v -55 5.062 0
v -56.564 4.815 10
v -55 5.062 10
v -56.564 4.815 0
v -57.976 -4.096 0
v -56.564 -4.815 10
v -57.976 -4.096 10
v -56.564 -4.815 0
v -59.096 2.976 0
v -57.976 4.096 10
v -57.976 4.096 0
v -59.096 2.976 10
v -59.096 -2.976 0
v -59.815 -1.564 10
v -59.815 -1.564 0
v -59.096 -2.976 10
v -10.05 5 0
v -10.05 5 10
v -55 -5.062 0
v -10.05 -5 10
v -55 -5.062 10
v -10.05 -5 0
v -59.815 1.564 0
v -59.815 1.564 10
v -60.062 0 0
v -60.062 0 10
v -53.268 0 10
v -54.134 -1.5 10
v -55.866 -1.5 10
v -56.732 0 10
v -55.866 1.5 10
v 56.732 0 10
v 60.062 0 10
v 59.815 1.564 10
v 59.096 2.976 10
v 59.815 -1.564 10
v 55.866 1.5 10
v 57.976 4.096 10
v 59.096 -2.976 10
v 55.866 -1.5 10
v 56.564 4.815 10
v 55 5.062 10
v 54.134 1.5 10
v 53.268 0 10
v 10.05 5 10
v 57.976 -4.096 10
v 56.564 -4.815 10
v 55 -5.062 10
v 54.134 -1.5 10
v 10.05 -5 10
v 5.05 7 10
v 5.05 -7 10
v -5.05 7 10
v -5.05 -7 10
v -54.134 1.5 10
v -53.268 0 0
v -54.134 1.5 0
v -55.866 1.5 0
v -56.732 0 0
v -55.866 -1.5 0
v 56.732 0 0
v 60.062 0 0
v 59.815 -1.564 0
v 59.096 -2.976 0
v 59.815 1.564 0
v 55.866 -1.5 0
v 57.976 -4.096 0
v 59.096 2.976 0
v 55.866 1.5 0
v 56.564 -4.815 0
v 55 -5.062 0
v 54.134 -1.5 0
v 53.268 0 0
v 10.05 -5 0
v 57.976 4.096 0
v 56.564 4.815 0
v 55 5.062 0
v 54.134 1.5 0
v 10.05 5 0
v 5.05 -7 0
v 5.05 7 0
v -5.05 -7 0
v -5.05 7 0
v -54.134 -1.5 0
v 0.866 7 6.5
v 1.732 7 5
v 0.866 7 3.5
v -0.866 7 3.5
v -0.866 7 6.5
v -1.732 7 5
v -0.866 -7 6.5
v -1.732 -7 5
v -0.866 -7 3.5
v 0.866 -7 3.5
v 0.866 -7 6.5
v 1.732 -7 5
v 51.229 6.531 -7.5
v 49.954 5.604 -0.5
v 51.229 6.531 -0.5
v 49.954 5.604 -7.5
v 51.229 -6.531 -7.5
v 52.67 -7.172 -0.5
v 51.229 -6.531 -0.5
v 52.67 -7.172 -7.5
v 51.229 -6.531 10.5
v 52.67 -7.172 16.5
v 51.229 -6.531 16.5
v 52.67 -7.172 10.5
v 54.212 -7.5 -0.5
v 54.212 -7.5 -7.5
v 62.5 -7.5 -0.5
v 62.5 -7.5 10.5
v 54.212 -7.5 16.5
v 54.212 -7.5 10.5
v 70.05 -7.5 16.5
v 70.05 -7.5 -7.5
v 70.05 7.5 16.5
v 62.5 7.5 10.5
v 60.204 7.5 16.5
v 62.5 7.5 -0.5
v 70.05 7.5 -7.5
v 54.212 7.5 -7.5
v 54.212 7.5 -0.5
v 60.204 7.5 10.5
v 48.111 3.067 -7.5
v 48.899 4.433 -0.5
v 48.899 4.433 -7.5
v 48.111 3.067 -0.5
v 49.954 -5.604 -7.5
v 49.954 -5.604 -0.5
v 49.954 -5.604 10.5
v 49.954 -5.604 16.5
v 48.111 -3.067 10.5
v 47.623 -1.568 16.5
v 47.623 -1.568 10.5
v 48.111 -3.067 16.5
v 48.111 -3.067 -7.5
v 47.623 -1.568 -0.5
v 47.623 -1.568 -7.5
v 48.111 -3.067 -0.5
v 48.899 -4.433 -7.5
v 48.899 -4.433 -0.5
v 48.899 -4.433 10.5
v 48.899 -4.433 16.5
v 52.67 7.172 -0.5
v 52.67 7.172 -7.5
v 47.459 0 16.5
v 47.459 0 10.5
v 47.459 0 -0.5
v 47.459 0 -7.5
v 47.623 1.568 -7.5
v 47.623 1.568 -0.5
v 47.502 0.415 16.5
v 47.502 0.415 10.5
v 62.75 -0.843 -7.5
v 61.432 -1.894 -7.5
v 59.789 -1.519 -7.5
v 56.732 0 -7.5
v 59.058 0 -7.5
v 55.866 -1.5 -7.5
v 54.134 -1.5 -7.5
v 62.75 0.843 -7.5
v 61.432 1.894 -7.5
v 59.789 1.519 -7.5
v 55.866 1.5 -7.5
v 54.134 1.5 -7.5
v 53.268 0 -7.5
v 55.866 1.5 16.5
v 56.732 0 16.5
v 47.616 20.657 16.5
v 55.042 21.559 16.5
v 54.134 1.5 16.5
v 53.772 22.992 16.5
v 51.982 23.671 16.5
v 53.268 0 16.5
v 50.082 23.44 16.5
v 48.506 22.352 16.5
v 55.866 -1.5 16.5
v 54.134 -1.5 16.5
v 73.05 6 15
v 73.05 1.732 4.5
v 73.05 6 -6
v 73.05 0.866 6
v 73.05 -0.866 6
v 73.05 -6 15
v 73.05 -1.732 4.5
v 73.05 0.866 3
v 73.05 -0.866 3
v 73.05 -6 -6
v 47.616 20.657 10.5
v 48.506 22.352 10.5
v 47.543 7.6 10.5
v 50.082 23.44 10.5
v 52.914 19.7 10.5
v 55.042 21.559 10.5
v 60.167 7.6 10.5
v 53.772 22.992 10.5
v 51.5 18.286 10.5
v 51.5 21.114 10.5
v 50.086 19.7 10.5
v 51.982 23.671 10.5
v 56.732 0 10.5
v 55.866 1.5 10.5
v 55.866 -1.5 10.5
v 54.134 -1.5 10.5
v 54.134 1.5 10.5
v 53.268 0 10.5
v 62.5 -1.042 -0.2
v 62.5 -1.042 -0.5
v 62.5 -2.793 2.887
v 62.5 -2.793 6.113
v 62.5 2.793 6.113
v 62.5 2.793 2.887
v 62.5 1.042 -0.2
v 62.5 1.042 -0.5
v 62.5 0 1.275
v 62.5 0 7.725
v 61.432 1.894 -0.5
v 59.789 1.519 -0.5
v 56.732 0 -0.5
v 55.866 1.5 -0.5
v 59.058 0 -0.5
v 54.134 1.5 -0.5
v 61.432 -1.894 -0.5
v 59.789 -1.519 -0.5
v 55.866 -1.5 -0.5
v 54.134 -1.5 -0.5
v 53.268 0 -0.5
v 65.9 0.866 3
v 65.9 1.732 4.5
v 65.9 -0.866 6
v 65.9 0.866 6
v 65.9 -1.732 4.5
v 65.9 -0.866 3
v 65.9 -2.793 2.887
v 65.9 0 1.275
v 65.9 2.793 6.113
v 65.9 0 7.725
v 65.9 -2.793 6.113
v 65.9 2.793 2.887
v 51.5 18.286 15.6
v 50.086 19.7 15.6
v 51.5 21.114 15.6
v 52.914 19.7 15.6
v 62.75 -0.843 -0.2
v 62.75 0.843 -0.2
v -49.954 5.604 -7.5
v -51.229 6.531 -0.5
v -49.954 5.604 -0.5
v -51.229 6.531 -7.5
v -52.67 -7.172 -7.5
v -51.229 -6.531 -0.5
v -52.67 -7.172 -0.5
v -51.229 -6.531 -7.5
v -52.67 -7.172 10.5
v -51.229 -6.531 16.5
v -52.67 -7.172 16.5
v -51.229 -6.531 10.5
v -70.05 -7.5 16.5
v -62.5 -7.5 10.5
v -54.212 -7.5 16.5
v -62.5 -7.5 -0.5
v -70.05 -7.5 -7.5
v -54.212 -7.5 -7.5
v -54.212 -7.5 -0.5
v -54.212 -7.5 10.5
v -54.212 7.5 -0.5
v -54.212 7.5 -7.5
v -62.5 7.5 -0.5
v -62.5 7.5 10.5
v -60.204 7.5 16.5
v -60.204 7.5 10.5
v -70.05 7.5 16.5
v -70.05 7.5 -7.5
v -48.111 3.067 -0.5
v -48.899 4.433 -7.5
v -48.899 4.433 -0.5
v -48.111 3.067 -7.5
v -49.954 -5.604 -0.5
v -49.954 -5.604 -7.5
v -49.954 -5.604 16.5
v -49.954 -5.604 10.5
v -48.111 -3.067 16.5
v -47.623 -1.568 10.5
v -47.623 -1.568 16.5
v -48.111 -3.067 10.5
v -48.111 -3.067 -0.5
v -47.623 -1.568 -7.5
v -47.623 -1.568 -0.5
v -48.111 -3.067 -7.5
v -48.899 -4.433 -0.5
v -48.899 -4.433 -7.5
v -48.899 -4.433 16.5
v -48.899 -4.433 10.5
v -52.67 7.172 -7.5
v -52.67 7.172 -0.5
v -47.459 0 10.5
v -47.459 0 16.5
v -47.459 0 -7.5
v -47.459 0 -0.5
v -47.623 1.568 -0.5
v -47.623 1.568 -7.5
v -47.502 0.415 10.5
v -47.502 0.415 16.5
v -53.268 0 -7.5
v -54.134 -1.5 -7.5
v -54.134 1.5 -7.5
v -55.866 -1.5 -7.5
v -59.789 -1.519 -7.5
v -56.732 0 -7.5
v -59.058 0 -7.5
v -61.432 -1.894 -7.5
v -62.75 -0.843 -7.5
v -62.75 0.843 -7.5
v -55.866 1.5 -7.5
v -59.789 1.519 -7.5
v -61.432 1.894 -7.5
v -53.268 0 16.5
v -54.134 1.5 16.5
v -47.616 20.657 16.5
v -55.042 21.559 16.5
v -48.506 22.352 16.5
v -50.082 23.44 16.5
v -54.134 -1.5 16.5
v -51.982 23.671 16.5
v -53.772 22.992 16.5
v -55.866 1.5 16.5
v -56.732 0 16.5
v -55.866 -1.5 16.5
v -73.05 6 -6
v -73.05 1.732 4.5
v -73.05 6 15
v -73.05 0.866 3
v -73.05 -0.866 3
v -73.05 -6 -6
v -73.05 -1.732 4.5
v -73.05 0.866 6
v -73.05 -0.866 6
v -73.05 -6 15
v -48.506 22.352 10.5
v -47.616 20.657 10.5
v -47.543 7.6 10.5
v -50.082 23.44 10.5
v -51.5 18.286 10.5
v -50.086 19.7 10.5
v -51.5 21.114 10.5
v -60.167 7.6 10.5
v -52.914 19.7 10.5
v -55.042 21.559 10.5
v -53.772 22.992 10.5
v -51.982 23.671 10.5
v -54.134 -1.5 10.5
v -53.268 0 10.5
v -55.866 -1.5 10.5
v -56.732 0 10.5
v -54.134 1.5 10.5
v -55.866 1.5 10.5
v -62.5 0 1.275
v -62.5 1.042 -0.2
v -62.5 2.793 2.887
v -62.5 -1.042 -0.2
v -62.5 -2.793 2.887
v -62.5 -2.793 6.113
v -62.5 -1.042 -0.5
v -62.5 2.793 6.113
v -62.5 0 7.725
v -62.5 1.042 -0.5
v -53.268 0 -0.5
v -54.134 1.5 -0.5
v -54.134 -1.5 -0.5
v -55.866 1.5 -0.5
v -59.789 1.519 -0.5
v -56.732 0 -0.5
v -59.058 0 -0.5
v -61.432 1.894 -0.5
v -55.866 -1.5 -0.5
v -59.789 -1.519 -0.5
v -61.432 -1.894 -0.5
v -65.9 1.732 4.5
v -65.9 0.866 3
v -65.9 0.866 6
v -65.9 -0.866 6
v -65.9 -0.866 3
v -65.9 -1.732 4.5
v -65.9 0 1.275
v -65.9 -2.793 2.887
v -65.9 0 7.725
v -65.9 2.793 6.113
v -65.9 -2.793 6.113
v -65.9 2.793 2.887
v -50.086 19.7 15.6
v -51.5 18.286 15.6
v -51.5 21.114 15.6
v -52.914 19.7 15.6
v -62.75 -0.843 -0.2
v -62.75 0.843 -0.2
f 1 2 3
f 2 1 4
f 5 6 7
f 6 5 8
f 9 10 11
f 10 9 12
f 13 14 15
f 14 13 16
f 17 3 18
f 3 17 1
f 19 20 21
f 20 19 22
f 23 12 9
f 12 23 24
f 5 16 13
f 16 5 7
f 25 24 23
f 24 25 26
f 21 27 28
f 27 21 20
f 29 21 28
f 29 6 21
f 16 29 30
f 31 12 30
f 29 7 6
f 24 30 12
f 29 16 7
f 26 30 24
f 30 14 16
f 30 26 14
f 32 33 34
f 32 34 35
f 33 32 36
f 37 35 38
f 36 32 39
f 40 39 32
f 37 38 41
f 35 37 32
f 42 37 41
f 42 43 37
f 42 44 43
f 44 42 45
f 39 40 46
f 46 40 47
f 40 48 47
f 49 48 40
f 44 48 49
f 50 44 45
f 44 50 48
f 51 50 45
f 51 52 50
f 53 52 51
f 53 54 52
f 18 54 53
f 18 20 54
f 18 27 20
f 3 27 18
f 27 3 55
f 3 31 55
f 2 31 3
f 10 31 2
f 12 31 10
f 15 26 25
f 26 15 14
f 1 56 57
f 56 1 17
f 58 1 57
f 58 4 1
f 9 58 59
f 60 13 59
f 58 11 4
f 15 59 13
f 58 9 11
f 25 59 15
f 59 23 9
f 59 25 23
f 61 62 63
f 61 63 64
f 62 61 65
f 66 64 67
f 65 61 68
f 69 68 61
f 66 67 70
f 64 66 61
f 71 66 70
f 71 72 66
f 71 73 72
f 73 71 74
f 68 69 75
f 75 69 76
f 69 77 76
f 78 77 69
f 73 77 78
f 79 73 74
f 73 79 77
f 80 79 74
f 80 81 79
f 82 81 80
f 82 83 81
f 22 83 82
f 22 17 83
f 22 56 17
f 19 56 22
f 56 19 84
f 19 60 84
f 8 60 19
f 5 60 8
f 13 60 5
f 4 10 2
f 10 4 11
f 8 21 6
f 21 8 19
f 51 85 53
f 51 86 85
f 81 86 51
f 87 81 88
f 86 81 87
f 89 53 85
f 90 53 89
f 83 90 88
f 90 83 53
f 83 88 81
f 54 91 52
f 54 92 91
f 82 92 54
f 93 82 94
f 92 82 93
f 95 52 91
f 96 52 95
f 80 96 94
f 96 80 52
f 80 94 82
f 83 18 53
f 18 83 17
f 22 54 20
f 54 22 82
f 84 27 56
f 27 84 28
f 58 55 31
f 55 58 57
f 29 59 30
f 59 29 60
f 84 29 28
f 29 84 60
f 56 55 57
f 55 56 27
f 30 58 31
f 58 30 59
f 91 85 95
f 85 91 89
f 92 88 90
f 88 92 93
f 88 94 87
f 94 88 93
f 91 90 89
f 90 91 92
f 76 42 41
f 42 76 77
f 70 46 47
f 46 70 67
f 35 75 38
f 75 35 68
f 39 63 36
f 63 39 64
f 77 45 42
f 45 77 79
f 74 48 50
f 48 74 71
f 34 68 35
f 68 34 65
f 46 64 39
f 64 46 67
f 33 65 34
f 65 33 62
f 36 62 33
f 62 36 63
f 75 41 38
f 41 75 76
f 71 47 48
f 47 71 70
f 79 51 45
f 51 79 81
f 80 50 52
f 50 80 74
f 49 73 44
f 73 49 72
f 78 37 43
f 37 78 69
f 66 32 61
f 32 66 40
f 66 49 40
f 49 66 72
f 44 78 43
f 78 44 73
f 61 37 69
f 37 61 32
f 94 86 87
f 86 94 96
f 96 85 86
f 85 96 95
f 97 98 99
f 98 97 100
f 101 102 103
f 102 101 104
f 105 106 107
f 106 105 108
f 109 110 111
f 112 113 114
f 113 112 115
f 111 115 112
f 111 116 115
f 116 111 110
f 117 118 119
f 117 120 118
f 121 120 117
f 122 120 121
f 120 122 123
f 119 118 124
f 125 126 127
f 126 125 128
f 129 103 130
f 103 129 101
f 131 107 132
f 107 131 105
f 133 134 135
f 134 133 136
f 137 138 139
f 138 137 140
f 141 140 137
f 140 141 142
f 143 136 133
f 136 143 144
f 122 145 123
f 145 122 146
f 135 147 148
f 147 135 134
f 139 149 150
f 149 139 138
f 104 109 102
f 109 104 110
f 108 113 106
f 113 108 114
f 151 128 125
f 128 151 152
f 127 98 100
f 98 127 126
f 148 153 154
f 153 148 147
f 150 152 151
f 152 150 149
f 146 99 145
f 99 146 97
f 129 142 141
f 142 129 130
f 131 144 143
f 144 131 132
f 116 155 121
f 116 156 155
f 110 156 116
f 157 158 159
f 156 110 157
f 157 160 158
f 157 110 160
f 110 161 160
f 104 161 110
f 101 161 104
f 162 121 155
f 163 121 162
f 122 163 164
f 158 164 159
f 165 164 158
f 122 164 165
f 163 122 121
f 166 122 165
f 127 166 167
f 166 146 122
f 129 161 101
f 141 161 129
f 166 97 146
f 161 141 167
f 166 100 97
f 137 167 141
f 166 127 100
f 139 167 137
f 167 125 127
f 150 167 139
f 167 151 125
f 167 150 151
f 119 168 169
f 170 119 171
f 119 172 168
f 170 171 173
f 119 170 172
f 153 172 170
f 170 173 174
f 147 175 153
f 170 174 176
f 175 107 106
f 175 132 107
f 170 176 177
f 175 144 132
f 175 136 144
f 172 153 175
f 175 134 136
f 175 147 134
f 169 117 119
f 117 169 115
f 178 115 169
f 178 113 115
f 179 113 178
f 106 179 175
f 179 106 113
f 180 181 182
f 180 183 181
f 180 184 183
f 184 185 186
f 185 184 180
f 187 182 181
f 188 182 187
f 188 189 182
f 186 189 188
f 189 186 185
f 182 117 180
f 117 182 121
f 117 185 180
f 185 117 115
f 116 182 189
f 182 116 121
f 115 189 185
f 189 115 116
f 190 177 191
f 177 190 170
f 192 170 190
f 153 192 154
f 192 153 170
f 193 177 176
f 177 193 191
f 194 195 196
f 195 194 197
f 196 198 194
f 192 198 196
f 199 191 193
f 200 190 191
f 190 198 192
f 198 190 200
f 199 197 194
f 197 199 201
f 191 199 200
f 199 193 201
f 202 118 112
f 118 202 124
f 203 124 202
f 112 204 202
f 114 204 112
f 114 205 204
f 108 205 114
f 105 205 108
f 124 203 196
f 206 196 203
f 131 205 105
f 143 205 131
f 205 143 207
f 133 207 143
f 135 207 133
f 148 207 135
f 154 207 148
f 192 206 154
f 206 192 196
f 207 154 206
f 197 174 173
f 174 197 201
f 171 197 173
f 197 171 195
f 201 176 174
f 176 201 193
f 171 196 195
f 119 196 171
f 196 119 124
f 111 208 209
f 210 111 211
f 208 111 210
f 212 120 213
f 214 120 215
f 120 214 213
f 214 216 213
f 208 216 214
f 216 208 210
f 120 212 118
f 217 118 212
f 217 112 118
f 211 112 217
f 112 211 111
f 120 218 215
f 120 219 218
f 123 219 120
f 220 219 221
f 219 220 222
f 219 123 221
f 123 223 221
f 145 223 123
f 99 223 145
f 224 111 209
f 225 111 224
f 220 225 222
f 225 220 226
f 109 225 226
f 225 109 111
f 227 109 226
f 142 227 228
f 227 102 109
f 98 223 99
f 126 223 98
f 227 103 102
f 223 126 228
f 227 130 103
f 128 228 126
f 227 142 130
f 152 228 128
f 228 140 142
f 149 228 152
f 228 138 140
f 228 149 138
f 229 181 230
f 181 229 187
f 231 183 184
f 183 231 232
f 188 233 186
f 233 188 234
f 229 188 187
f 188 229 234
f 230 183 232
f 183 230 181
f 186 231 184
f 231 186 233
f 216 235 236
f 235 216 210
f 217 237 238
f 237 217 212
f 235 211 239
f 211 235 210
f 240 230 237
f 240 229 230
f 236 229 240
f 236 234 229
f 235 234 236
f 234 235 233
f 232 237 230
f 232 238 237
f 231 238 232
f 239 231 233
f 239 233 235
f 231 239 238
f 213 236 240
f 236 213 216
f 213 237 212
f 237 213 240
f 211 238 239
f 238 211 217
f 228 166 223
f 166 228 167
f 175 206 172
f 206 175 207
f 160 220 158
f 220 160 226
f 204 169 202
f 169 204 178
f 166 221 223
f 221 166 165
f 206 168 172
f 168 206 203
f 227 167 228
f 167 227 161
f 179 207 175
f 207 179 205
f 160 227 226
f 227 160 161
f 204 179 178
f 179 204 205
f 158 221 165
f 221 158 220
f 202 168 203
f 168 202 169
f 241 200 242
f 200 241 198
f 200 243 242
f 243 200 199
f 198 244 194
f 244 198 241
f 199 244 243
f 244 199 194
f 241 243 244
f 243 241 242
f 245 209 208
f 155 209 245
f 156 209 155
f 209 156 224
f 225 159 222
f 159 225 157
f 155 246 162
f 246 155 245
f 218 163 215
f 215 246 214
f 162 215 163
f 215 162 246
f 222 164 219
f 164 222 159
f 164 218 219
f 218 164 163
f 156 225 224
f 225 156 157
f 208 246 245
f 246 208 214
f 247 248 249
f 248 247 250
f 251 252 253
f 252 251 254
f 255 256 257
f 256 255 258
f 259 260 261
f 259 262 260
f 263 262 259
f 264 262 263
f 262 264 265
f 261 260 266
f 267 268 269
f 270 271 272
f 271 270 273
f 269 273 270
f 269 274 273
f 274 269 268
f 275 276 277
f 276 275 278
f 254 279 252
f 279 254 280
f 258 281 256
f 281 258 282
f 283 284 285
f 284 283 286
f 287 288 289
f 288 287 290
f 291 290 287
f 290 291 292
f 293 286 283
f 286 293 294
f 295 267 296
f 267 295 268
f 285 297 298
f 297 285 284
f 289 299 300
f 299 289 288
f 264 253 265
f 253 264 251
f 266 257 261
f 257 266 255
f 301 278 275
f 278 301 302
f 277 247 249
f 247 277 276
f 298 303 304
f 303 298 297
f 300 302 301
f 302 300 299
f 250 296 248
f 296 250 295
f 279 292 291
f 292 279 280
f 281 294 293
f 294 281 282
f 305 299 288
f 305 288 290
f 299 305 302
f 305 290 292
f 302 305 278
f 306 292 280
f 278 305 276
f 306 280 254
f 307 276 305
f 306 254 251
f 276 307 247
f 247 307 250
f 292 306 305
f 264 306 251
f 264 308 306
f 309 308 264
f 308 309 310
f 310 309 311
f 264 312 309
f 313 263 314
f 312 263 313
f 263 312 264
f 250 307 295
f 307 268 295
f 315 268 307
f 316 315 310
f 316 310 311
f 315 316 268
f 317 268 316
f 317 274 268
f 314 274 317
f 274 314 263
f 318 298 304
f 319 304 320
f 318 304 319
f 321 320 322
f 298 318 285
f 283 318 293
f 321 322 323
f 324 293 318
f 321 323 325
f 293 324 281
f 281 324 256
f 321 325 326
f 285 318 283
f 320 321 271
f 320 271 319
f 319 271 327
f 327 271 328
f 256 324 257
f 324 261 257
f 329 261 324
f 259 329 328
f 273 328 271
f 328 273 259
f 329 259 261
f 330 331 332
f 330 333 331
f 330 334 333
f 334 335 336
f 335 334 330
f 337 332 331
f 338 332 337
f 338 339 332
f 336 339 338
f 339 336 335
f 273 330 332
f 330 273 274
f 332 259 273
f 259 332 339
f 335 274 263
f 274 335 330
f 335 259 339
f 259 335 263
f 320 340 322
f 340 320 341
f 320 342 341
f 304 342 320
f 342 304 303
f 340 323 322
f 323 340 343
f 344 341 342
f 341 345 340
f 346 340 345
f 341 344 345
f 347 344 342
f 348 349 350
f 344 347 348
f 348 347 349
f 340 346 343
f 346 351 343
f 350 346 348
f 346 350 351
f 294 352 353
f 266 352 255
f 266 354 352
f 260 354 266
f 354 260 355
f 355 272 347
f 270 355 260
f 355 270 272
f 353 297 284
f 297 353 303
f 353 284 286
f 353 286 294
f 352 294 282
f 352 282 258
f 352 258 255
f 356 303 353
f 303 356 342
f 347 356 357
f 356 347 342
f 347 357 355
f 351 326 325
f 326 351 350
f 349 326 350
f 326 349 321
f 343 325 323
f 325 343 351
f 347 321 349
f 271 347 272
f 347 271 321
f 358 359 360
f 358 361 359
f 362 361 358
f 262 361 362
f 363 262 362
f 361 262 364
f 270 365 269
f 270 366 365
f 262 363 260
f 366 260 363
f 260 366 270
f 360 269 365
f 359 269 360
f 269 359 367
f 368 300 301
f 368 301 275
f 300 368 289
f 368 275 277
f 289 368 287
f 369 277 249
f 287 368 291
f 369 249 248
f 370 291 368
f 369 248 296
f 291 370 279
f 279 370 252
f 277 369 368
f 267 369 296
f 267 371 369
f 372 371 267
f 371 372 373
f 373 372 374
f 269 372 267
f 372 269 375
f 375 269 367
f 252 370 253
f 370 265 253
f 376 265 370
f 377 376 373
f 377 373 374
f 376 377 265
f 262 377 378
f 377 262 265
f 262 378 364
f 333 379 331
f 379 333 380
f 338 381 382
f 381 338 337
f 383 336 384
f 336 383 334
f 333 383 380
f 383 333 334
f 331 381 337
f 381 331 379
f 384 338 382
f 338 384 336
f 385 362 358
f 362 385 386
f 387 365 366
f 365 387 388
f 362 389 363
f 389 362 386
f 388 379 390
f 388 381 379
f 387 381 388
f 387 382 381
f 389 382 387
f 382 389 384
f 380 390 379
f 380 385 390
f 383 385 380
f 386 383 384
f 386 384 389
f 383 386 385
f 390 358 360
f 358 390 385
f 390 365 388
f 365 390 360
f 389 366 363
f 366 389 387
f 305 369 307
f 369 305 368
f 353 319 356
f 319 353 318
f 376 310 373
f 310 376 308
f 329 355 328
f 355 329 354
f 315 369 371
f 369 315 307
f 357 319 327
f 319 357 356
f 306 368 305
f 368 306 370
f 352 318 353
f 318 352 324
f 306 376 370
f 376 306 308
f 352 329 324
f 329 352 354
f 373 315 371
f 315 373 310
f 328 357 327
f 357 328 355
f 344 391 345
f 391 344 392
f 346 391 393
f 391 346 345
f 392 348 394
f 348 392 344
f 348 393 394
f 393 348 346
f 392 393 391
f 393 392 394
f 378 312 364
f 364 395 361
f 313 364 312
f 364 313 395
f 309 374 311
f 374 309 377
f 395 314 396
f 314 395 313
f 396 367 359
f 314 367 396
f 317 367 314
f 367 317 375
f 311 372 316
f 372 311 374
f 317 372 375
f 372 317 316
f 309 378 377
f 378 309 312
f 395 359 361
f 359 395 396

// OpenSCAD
/*-----------------------------------------------------------------------------------

 Front axle for model Unimog M 1:16 (Bruder Toys chassis)
  
 (c) 2013 by Stemer114 (stemer114@gmail.com)
 License: licensed under the 
          Creative Commons - Attribution - Share Alike license. 
          http://creativecommons.org/licenses/by-sa/3.0/

 Credits: polyholes by nophead from MCAD library
          https://github.com/SolidCode/MCAD

-----------------------------------------------------------------------------------
*/

//-----------------------------------------------------------------------------------
//libraries
//-----------------------------------------------------------------------------------
use <MCAD/polyholes.scad>
//test_polyhole();


//-----------------------------------------------------------------------------------
//display settings
//-----------------------------------------------------------------------------------


//-----------------------------------------------------------------------------------
// View settings
// (when exporting single stls for printing, enable these one by one)
//-----------------------------------------------------------------------------------
show_AxleBody       = true;
show_AxleArmRight   = true;
show_AxleArmLeft    = true;
show_ServoConnector = false;
//explosion view
ex = 0;  // 0 - disabled, 1 - enabled

//-----------------------------------------------------------------------------------
// printer/printing settings
// (some dimensions are tuned to printer settings)
//
// the axle arms need to be printed upside down!
//-----------------------------------------------------------------------------------
layer_h = 0.3;  //layer height when printing
nozzle_d = 0.4; //nozzle size (adjust for your printer)

//-----------------------------------------------------------------------------------
// support settings
// (for the axle arms, you can enable creating support walls for printing
// the slicer might be able to create supports automtically
// but I prefer to create them manually just the way I need them
// when creating supports, enable explosion view (see above)
// else the model might look weird
//-----------------------------------------------------------------------------------
create_Support = false;
support_d = nozzle_d*3;  //support wall thickness (multiple of nozzle size)
support_color = "green"; //support color and alpha settings
support_alpha = 0.4;     //adjust these for better viewing in F5 mode

//-----------------------------------------------------------------------------------
//global configuration settings
//-----------------------------------------------------------------------------------
de = 0.1; //epsilon param, so differences are scaled and do not become manifold
fn_hole = 12;  //fn setting for round holes/bores (polyhole)


//-----------------------------------------------------------------------------------
//parameter settings (object dimensions)
//-----------------------------------------------------------------------------------

//P1xx - axle body
P100 = 10;  //height
P101 = 110;  //length
P102 = 10;  //thickness
P110 = 14;  //center support thickness
P111 = 20;  //center support width
P112 = 10;  //center support outer width
P120 = 3;   //diameter Achsschenkelbohrung
P121 = 3;   //diameter central support bore

//P2xx axle arm 
P200exRight = [15, 0, 0];    //explosion view offset vector (right arm)
P200exLeft  = [-15, 0, 0];   //explosion view offset vector (left arm)
P201 = P100+1;  //clearance height
P202 = 7;     //thickness bottom
P203 = 6;     //thickness top
P205 = 15;      //arm width
P206 = 18;      //arm length towards wheel
P207 = 15;      //inner clearance
P2081 = 3;      //offset endcap (x)
P2082 = 3;      //offset endcap (z)
P2083 = 3;      //offset endcap (y)
P210 = 3;       //diameter wheel axle bore
P220 = 3;       //diameter axle connect bore
//steering arm
P230 = 19.7;    //steering arm y offset
P231 = 3.5;     //steering arm x offset
P232 = 8;       //steering arm end width
P233 = P205;    //steering arm width at axle arm
P235 = 2;       //dia for connecting tie rod
P236 = P220;    //dia for axle arm connect
//alignment cutout for servo connector beam
//(on both sides, so one is free where to put the servo connector beam)
P240 = 6;       //offset from axle connector
P241 = 3.5;       //diameter (polyhole)
P242 = P202+layer_h;       //depth

//P3xx - Servo connector arm (below)
P300ex = [15, 0, -9];    //explosion view offset vector
P300 = P101/2;  //length
P301 = P240;    //offset to alignemnt bolt
P302 = P206-P2081;    //length outside part
P305 = P205;    //width outside part
P306 = 6;       //thickness
P307 = 3;       //connecting beam width
P310 = 8;       //servo connector diameter
P320 = 2;       //dia for ball head mounting
P321 = P220;    //dia for axle mounting
P322 = P241-0.2;    //dia for alignment bolt

//-----------------------------------------------------------------------------------
// nut trap config
// screw/nut dimensions for use (plus clearance for fitting purpose)
//-----------------------------------------------------------------------------------
nut_trap_wrenchsize = 5.5; //for M3 nut
nut_trap_depth = 3.5;      //nyloc


//-----------------------------------------------------------------------------------
// main rendering
//-----------------------------------------------------------------------------------

//for debugging, show transparent cube at origin
//if (show_debugging_cube)
//	%cube(10);

AxleAssembly();



//-----------------------------------------------------------------------------------
// modules
//-----------------------------------------------------------------------------------

// render the complete assembly, depending what components are enabled
module AxleAssembly()
{
    union()
    {
        if (show_AxleBody) {
            translate([0, 0, 0])
                AxleBody();
        }
        if (show_AxleArmRight) {
            translate(P200exRight*ex)
            translate([P101/2, 0, -P202 - (P201-P100)/2])
                AxleArmRight();
        }
        if (show_AxleArmLeft) {
            translate(P200exLeft*ex)
            translate([-P101/2, 0, -P202 - (P201-P100)/2])
                AxleArmLeft();
        }
        if (show_ServoConnector) {
            translate(P300ex*ex)
            translate([0, 0, P100/2-P201/2-P202-P306])
            ServoConnector();
        }
 

    }  //end union

}  //end module


module AxleBody()
{
    //left arm
    AxleBodyArm();
    //right arm
    mirror([1, 0, 0]) AxleBodyArm();
}

//arm is oriented towards left
module AxleBodyArm()
{
    difference()
    {
        union()
        {
            //outer part
            hull() {
                translate([-P101/2, 0, 0])
                    //cylinder(h=P100, r=P102/2);
                    polyhole(P100, P102);
                translate([-P111/2, 0, P100/2])
                    cube([de, P102, P100], center=true);
             }
            
            //intermediate part
            hull() {
                translate([-P111/2, 0, P100/2])
                    cube([de, P102, P100], center=true);
                translate([-P112/2, 0, P100/2])
                    cube([de, P110, P100], center=true);
             }

            //center part
            hull() {
                translate([-P112/2, 0, P100/2])
                    cube([de, P110, P100], center=true);
                translate([0, 0, P100/2])
                    cube([de, P110, P100], center=true);
              }
        }

        union()
        {
            //outer bore for Achsschenkel
            translate([-P101/2, 0, -de])
                polyhole(P100+2*de, P120);

            //bore for central support
            translate([0, P110/2+de, P100/2])
                rotate([90, 0, 0])
                polyhole(P110+2*de, P121);

        }
    }
}

module AxleArmRight()
{
    AxleArm();
}

module AxleArmLeft()
{
    mirror([1, 0, 0]) 
    {
        AxleArm();
    }
}
 
 

//Achsschenkel rechts, nur mit Lenkhebel
module AxleArm()
{
    difference()
    {
        union()
        {
            //axle inner part with connector to axle body
            hull() {
                translate([0, 0, 0])
                    //cylinder(h=P201+P202+P203, r=P205/2);
                    polyhole(P201+P202+P203, P205);
                translate([P206-P2081, 0, (P201+P202+P203)/2])
                    cube([de, P205, P201+P202+P203], center=true);
            }
            //outer part with chamfers and bore for wheel axle
            hull() {
                translate([P206-P2081, 0, (P201+P202+P203)/2])
                    cube([de, P205, P201+P202+P203], center=true);
                translate([P206, 0, (P201+P202+P203)/2])
                    cube([de, P205-P2083, P201+P202+P203-P2082], center=true);
            }

            //steering arm
            hull() {
                //end on axle arm
                translate([0, 0, P201+P202]) cylinder(h=P203, r=P233/2);
                //end on tie rod
                //translate([-P231, P230, P201+P203]) cylinder(h=P203, r=P232/2);
                translate([-P231, P230, P201+P202]) cylinder(h=P203, r=P232/2);
            }

        }

        union()
        {
            //cutout for mounting on axle body
            translate([-P205/2-de, -(P205+2*de)/2, P202])
                cube([P207+de, P205+2*de, P201], center=false);

            //bore for wheel axle
            translate([0, 0, (P201+P202+P203)/2])
                rotate([90, 0, 90])
                polyhole(P206+2*de, P210);

            //nut trap
            //source: http://forum.openscad.org/Drawing-tools-td4551i20.html
            translate([-P205/2+P207-de, 0, (P201+P202+P203)/2])
            rotate([0,90,0])
            cylinder(r = nut_trap_wrenchsize / 2 / cos(180 / 6) + 0.05, h=nut_trap_depth, $fn=6);

            //bore for connecting to axle body
            translate([0, 0, -de])
                //cylinder(h=P201+P202+P203+2*de, r=P220/2);
                polyhole(P201+P202+P203+2*de, P220);

            //bore for steering arm on axle arm side
            translate([0, 0, P201+P203])
                //translate([0, 0, -de]) cylinder(h=P203+2*de, r=P236/2);
                translate([0, 0, -de]) polyhole(P203+2*de, P236);

            //bore for steering arm on tie rod connecting side
            translate([-P231, P230, P201+P203])
                translate([0, 0, -de]) polyhole(P203+2*de, P235);

            //cutout for servo connector
            translate([P240, 0, -de])
                polyhole(P242+de, P241);

        }
    }

    //now add support walls if configured
    if (create_Support) {
        color(support_color, support_alpha) {

            /*
               support structure is a cylinder with bore, bore diameter is P220
               that way, after printing, the support cylinder can be easily cut away
               the volume of the complete part is quite small anyway
               therefore, a hollow support structure would bring more problems
               than it could possibly solve
               */

            translate([0, 0, P202])
            {
                //outer
                difference() {
                    polyhole(P201, P205);
                    translate([0, 0, -de]) polyhole(P201+2*de, P220);
                }
            }  //translate

            /* support structure is one side of a cylinder
               with a bottom of one layer thickness
               when the arm is printed upside down (because of the steering arm being
               at the base then)
               the bottom of the support structure supports printing the upper brackets
               polyhole
             */
            /*
            translate([0, 0, P202])
            {
                difference() {
                    hull() {
                    polyhole(P201, P205);
                    translate([+de-P205/2+P207, 0, P201/2])
                        cube([de, P205, P201], center=true);
                     }
                    translate([0, 0, layer_h]) polyhole(P201-layer_h+de, P205*2/3);
                    translate([(P207+de)/2, 0, P201/2+layer_h])
                        cube([P207+de, P205+2*de, P201], center=true);
                }
            } 
            */
 

        }  //color

    } //if support
}


//ServoConnector - beam for connecting one of the axle arms to a ball coupling
//with the steering servo
module ServoConnector()
{
    difference()
    {
        union()
        {
            hull() {
            hull() {
                translate([P300, 0, 0])
                    cylinder(h=P306, r=P305/2);
                translate([P300+P302, 0, P306/2])
                    cube([de, P305, P306], center=true);
            }

            //servo connector
            translate([0, 0, 0])
                polyhole(P306, P310);
            }

        }

        union()
        {
            //bore for connecting to axle body
            translate([P300, 0, -de])
                //cylinder(h=P201+P202+P203+2*de, r=P220/2);
                polyhole(P201+P202+P203+2*de, P220);

            //bore for alignment bolt
            //in combination with the cutout in the axle arm, 
            //a piece of 3mm print wire can be used for fixing the alignment
            translate([P300+P301, 0, -de])
                polyhole(P306+2*de, P322);

            //bore for ball coupling to servo
            translate([0, 0, -de])
                polyhole(P306+2*de, P320);
 
        }
    }
}
